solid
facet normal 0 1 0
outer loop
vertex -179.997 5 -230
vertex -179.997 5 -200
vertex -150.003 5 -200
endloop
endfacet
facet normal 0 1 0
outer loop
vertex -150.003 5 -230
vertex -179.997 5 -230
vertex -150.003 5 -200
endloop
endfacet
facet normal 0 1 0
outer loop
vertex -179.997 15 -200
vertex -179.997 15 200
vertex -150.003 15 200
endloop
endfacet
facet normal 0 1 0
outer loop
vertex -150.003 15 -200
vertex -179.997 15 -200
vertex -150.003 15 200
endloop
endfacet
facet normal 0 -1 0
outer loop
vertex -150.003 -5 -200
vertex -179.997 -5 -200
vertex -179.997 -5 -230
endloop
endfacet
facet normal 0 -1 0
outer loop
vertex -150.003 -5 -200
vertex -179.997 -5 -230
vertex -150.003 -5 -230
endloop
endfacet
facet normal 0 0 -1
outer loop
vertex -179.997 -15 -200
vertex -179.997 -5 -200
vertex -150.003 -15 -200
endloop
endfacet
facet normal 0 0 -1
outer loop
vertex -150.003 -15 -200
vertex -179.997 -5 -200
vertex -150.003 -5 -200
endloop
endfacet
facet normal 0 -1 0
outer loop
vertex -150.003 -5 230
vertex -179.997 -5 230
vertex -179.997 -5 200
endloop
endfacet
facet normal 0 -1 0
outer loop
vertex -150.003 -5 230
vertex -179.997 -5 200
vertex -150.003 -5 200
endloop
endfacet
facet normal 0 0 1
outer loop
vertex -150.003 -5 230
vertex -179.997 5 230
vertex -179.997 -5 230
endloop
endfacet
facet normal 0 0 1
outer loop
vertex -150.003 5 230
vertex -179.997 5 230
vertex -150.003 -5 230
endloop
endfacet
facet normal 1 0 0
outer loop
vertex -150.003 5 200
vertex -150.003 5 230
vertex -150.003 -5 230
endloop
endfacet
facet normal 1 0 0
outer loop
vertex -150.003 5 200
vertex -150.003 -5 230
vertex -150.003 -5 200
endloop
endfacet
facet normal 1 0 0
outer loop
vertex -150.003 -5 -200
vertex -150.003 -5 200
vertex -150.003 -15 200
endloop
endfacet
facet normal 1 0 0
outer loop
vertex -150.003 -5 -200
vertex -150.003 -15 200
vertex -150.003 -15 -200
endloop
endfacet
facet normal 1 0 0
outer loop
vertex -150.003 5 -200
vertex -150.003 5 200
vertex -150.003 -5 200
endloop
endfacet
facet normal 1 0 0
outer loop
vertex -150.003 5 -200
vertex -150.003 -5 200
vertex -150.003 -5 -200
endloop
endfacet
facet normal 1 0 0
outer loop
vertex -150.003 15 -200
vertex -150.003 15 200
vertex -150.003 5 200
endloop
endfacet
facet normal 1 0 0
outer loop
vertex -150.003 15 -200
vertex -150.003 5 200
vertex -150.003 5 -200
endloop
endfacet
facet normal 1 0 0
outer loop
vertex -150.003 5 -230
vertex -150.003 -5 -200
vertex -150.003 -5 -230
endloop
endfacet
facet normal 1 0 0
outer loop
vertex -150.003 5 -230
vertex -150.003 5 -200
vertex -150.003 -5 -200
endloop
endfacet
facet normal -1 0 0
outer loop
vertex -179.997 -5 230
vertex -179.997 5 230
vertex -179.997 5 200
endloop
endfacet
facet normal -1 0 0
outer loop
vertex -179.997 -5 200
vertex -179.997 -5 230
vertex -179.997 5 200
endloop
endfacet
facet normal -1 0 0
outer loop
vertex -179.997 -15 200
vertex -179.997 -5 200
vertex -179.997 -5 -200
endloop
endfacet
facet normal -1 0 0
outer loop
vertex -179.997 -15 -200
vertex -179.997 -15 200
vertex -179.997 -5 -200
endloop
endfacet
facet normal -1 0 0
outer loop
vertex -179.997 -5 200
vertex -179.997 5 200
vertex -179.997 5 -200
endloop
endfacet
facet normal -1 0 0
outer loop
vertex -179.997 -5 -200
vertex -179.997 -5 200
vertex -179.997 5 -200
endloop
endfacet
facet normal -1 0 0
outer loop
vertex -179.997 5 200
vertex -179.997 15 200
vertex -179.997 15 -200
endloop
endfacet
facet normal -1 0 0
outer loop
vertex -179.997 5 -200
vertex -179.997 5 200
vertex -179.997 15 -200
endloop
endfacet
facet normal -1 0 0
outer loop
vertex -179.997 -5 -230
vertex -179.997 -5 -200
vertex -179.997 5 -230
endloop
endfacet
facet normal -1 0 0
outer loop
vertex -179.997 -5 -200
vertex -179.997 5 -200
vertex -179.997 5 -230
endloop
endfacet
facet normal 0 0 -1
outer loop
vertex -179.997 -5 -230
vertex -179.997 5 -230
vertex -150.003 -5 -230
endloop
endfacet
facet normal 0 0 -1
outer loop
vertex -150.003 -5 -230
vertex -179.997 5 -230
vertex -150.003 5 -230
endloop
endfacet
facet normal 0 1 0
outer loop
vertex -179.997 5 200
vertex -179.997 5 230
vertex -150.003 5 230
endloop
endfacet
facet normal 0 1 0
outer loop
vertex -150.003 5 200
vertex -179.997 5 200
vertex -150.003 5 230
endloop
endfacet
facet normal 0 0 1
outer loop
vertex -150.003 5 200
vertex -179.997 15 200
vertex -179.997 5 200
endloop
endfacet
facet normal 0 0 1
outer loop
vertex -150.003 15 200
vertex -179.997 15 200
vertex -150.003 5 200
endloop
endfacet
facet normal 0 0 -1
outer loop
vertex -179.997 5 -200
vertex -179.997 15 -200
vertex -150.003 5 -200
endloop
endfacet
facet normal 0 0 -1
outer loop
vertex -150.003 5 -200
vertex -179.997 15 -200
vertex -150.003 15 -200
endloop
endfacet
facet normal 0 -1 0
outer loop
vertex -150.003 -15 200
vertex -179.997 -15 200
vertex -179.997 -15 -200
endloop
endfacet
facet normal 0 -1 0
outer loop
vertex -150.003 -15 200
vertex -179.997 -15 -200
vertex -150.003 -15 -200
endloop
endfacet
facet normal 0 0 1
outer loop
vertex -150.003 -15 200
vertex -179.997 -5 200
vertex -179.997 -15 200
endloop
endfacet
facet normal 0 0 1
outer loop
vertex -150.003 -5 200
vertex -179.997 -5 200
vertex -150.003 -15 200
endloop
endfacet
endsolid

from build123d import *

# Parameters (mm, degrees)
CROQUIS1_W              = 29.994038168
CROQUIS1_H              = 460
SALIENTE_EXTRUIR1_DEPTH = 5
CROQUIS2_W              = 29.994038168
CROQUIS2_H              = 400
SALIENTE_EXTRUIR2_DEPTH = 15


with BuildPart() as part:
    # Croquis1 → Saliente-Extruir1 (new, symmetric)
    with BuildSketch(Plane(origin=(0, 0, 0), x_dir=(1, 0, 0), z_dir=(0, 1, 0))):
        with Locations((-165, 0)):
            Rectangle(CROQUIS1_W, CROQUIS1_H)
    extrude(amount=SALIENTE_EXTRUIR1_DEPTH, both=True)

    # Croquis2 → Saliente-Extruir2 (add, symmetric)
    with BuildSketch(Plane(origin=(0, 0, 0), x_dir=(1, 0, 0), z_dir=(0, 1, 0))):
        with Locations((-165, 0)):
            Rectangle(CROQUIS2_W, CROQUIS2_H)
    extrude(amount=SALIENTE_EXTRUIR2_DEPTH, both=True)


solid = part.part
